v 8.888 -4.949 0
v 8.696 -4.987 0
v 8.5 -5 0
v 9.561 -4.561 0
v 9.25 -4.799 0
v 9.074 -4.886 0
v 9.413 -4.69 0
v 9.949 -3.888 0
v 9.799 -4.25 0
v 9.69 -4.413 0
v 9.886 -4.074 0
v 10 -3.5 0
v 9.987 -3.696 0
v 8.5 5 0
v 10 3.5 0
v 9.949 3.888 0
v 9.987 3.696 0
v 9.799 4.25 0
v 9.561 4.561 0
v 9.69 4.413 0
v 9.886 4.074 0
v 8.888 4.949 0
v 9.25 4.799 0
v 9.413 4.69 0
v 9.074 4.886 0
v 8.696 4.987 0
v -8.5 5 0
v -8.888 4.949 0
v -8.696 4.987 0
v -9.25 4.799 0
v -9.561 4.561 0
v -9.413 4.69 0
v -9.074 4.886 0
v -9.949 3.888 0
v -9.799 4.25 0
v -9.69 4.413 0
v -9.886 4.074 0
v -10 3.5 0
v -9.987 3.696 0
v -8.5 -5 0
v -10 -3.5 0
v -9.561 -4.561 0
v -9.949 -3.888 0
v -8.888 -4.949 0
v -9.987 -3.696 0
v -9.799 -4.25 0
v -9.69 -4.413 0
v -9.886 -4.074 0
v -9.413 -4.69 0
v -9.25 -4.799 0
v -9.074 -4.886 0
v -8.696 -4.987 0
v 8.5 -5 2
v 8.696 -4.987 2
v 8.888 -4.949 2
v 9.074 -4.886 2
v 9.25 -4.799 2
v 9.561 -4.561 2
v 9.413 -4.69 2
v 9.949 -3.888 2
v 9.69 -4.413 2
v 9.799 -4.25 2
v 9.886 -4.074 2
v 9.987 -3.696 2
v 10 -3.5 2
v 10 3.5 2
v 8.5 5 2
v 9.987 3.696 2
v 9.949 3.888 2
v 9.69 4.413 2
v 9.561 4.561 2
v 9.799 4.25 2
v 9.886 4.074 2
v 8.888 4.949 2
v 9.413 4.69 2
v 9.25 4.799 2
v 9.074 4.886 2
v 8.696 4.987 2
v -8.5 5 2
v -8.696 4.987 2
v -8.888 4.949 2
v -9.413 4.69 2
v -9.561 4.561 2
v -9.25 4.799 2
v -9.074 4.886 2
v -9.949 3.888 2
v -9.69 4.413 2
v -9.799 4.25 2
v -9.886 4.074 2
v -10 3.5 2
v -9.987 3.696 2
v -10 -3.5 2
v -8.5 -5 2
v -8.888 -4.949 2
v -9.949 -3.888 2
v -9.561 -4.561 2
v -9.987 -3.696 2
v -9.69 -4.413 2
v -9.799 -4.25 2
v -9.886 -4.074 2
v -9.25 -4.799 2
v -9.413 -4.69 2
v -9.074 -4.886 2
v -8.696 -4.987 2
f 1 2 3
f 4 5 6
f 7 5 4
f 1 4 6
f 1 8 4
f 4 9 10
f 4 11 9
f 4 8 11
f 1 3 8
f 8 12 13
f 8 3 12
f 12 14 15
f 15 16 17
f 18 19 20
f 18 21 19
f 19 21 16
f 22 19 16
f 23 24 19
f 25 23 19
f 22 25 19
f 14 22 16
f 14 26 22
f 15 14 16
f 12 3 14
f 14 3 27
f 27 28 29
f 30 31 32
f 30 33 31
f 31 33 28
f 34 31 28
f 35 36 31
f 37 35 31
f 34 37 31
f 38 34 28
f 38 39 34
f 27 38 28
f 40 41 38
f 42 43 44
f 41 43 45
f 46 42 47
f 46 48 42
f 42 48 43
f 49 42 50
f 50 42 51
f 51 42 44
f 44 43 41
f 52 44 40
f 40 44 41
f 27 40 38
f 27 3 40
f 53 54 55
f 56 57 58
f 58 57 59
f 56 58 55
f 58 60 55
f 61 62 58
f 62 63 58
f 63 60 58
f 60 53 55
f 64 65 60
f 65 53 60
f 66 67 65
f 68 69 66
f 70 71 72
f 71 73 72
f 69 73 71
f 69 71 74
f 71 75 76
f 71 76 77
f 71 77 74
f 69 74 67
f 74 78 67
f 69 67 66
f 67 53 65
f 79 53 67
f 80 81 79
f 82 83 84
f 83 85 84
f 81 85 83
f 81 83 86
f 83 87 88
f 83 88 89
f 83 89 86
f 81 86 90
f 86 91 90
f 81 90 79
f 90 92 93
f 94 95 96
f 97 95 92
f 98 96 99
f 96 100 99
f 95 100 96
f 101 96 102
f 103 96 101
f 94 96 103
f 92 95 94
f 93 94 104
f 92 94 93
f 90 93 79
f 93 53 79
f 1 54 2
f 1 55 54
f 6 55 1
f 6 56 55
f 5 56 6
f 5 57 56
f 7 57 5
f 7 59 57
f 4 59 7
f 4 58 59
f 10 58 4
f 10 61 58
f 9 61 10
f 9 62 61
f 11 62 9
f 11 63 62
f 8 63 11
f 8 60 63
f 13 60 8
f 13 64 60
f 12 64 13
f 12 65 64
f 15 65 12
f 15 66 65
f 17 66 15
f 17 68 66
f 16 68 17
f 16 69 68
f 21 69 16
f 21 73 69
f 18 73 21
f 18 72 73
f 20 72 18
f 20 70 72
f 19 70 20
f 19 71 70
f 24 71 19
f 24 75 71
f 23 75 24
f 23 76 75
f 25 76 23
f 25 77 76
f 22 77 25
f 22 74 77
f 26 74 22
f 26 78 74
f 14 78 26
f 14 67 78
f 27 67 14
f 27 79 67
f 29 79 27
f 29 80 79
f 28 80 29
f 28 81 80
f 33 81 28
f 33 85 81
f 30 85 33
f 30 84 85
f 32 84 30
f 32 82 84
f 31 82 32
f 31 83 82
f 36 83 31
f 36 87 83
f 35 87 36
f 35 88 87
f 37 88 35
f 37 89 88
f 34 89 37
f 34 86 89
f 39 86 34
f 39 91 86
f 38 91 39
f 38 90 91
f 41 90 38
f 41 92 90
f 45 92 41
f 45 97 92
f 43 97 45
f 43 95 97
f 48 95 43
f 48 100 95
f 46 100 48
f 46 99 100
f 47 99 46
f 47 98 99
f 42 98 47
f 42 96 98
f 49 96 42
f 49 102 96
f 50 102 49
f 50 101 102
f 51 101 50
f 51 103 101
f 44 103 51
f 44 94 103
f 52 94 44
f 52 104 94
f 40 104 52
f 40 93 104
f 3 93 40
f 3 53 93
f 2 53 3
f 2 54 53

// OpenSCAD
// Auto-generated from tests/data/feature_fixtures_manifest.json
// fixture: plate_plain_filleted_edges
// fixture_type: plate
// description: Plain plate with uniform vertical-edge fillet (rounded corners) that breaks strict side-boundary-plane coverage while preserving the flat top/bottom faces.
$fn = 96;

plate_size = [20.000000, 10.000000, 2.000000];
plate_origin = [-10.000000, -5.000000, 0.000000];

module through_hole(center, diameter, height) {
  translate(center) cylinder(d=diameter, h=height, center=false);
}

module through_slot(start, end, width, height) {
  hull() {
    through_hole(start, width, height);
    through_hole(end, width, height);
  }
}

module counterbore_hole(center, through_d, bore_d, bore_depth, plate_thickness) {
  translate([center[0], center[1], -0.1])
    cylinder(d=through_d, h=plate_thickness + 0.2, center=false);
  translate([center[0], center[1], plate_thickness - bore_depth])
    cylinder(d=bore_d, h=bore_depth + 0.1, center=false);
}

plate_edge_radius = 1.500000;
plate_inner_square = [17.000000, 7.000000];

difference() {
  linear_extrude(height=plate_size[2]) offset(r=plate_edge_radius, $fn=48) square(plate_inner_square, center=true);
}
